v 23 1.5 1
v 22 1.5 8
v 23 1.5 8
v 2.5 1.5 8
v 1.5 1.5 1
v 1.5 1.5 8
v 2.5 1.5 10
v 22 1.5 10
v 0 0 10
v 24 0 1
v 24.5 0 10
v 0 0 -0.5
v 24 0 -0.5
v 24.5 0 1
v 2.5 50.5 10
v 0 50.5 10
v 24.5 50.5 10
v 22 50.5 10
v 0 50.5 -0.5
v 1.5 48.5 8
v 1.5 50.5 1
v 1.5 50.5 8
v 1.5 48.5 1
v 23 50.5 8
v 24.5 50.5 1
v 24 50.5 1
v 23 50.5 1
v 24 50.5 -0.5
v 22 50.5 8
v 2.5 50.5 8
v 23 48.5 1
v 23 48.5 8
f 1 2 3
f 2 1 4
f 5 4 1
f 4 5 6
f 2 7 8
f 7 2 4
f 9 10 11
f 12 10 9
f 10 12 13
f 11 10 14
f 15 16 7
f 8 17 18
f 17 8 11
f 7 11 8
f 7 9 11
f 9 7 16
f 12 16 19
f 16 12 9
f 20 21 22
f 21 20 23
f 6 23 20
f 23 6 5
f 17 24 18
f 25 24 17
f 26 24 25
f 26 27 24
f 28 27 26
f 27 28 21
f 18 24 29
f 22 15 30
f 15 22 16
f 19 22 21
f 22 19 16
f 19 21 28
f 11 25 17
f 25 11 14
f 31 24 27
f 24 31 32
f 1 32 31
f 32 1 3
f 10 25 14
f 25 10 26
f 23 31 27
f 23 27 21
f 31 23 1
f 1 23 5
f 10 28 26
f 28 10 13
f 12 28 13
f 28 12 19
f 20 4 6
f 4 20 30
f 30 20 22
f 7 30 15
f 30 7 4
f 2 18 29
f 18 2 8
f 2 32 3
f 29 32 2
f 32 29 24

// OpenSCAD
// file: ../base/cube_hopper_base.scad
//Includes 
use <../base/cube_base.scad>

//Model information
model_length = 10;
model_depth = 10;
model_height = 10;
model_offset = 0;
rail_depth = .5;
rail_height = 3;
rail_thickness = 10;
box_height = 1;
model_opening = 0;
model_slack = 10;
hopper_height = 100;
hopper_wall_thickness = 10;

/*
translate([model_offset, model_offset, 0]){
	box(model_length, model_depth, model_height, 1);
}
*/

module hopper(model_length, model_depth, model_height, model_opening, rail_depth, rail_height, rail_thickness, hopper_height, hopper_wall_thickness, box_height, model_slack){
	//Calculated
	wall_length_calc = model_length * model_slack;
	model_depth_calc = model_depth * model_slack;
	model_height_calc = model_height * model_slack;

	//Wall 
	wall_length = [wall_length_calc, hopper_wall_thickness, wall_length_calc, hopper_wall_thickness];
	wall_depth = [hopper_wall_thickness, model_depth_calc, hopper_wall_thickness, model_depth_calc];
	wall_height = [hopper_height, hopper_height, hopper_height -model_opening, hopper_height];
	wall_box_height = [box_height, box_height, box_height, box_height];
	wall_offset = [
	[0, 0, 0],
	[0, 0, 0],
	[0, model_depth_calc - hopper_wall_thickness, model_opening],
	[wall_length_calc, 0, 0]
	];

	wall = [
	wall_length,
	wall_depth,
	wall_height,
	wall_box_height,
	wall_offset
	];
	
	//Rail
	rail = [
	rail_depth,
	model_depth_calc,
	rail_thickness
	];
	rail_offset_1 = [
	0,
	0,
	rail_height
	];
	rail_offset_2 = [
	wall_length_calc + hopper_wall_thickness -rail_depth,
	0,
	rail_height
	];
	rail_offset_3 = [
	0,
	0,
	hopper_height - rail_height - rail_thickness
	];
	rail_offset_4 = [
	wall_length_calc + hopper_wall_thickness -rail_depth,
	0,
	hopper_height - rail_height - rail_thickness
	];
	rail_offsets = [rail_offset_1, rail_offset_2, rail_offset_3, rail_offset_4];
	
	difference(){
		for(segment = [0:3]){
			translate(wall[4][segment]){
				box(wall[0][segment], wall[1][segment], wall[2][segment], wall[3][segment]);
			}
		}
		for(rail_offset = rail_offsets){
			translate(rail_offset){
				box(rail[0], rail[1], rail[2], 1);
			}
		}
	}
}
hopper(model_length, model_depth, model_height, model_opening, rail_depth, rail_height, rail_thickness, hopper_height, hopper_wall_thickness, box_height, model_slack);
// file: ../base/cube_base.scad
input_length = 10;
input_height = 10;
input_depth = 10;
box_size = 1;

module box(input_length, input_depth, input_height, box_size){
	length = input_length;
	height = input_height - box_size;
	depth = input_depth;

	bottom_back_left =   [0,      0,     0];
	top_back_left =      [0,      0,     height];
	bottom_front_left =  [0,      depth, 0];
	top_front_left =     [0,      depth, height];
	bottom_back_right =  [length, 0,     0];
	top_back_right =     [length, 0,     height];
	bottom_front_right = [length, depth, 0];
	top_front_right =    [length, depth, height];

	box = [bottom_back_left, top_back_left, bottom_front_left, top_front_left, bottom_back_right, top_back_right, bottom_front_right, top_front_right];

	hull(){
		for(position = box){
			translate(position){
				cube(box_size);
			}
		}
	}
}

box(input_length, input_depth, input_height, box_size);
// main file
//Includes 
use <../base/cube_base.scad>
use <../base/cube_hopper_base.scad>

//Bottom
bottom_length = 23;
bottom_depth = 49.5;
bottom_height = .5;

//Walls
wall_length = bottom_length;
wall_depth = bottom_depth;
wall_height = 10;
//wall_height = 5;
wall_opening = 1;
wall_thickness = .5;
wall_box_height = 1;
wall_slack = 1;

//Opening
opening_length = bottom_length -2.5;
opening_depth = 3;
opening_height = wall_height + 1;
opening_translate = [1.5, bottom_depth -1, 0];

//Rails
rail_thickness = 1.5;
rail_dimentions = [
rail_thickness,
bottom_depth,
0
];
rail_offset_1 = [
0,
0,
wall_height -1
];
rail_offset_2 = [
wall_length -1,
0,
wall_height -1
];

box(bottom_length, bottom_depth, bottom_height, 1);
difference(){
	hopper(wall_length, wall_depth, wall_height, wall_opening, 0, 0, 0, wall_height, wall_thickness, wall_box_height, wall_slack);
	translate(opening_translate){
		box(opening_length, opening_depth, opening_height, 1);
	}
}
translate(rail_offset_1){
	box(rail_dimentions[0], rail_dimentions[1], rail_dimentions[2], 1);
}
translate(rail_offset_2){
	box(rail_dimentions[0], rail_dimentions[1], rail_dimentions[2], 1);
}
